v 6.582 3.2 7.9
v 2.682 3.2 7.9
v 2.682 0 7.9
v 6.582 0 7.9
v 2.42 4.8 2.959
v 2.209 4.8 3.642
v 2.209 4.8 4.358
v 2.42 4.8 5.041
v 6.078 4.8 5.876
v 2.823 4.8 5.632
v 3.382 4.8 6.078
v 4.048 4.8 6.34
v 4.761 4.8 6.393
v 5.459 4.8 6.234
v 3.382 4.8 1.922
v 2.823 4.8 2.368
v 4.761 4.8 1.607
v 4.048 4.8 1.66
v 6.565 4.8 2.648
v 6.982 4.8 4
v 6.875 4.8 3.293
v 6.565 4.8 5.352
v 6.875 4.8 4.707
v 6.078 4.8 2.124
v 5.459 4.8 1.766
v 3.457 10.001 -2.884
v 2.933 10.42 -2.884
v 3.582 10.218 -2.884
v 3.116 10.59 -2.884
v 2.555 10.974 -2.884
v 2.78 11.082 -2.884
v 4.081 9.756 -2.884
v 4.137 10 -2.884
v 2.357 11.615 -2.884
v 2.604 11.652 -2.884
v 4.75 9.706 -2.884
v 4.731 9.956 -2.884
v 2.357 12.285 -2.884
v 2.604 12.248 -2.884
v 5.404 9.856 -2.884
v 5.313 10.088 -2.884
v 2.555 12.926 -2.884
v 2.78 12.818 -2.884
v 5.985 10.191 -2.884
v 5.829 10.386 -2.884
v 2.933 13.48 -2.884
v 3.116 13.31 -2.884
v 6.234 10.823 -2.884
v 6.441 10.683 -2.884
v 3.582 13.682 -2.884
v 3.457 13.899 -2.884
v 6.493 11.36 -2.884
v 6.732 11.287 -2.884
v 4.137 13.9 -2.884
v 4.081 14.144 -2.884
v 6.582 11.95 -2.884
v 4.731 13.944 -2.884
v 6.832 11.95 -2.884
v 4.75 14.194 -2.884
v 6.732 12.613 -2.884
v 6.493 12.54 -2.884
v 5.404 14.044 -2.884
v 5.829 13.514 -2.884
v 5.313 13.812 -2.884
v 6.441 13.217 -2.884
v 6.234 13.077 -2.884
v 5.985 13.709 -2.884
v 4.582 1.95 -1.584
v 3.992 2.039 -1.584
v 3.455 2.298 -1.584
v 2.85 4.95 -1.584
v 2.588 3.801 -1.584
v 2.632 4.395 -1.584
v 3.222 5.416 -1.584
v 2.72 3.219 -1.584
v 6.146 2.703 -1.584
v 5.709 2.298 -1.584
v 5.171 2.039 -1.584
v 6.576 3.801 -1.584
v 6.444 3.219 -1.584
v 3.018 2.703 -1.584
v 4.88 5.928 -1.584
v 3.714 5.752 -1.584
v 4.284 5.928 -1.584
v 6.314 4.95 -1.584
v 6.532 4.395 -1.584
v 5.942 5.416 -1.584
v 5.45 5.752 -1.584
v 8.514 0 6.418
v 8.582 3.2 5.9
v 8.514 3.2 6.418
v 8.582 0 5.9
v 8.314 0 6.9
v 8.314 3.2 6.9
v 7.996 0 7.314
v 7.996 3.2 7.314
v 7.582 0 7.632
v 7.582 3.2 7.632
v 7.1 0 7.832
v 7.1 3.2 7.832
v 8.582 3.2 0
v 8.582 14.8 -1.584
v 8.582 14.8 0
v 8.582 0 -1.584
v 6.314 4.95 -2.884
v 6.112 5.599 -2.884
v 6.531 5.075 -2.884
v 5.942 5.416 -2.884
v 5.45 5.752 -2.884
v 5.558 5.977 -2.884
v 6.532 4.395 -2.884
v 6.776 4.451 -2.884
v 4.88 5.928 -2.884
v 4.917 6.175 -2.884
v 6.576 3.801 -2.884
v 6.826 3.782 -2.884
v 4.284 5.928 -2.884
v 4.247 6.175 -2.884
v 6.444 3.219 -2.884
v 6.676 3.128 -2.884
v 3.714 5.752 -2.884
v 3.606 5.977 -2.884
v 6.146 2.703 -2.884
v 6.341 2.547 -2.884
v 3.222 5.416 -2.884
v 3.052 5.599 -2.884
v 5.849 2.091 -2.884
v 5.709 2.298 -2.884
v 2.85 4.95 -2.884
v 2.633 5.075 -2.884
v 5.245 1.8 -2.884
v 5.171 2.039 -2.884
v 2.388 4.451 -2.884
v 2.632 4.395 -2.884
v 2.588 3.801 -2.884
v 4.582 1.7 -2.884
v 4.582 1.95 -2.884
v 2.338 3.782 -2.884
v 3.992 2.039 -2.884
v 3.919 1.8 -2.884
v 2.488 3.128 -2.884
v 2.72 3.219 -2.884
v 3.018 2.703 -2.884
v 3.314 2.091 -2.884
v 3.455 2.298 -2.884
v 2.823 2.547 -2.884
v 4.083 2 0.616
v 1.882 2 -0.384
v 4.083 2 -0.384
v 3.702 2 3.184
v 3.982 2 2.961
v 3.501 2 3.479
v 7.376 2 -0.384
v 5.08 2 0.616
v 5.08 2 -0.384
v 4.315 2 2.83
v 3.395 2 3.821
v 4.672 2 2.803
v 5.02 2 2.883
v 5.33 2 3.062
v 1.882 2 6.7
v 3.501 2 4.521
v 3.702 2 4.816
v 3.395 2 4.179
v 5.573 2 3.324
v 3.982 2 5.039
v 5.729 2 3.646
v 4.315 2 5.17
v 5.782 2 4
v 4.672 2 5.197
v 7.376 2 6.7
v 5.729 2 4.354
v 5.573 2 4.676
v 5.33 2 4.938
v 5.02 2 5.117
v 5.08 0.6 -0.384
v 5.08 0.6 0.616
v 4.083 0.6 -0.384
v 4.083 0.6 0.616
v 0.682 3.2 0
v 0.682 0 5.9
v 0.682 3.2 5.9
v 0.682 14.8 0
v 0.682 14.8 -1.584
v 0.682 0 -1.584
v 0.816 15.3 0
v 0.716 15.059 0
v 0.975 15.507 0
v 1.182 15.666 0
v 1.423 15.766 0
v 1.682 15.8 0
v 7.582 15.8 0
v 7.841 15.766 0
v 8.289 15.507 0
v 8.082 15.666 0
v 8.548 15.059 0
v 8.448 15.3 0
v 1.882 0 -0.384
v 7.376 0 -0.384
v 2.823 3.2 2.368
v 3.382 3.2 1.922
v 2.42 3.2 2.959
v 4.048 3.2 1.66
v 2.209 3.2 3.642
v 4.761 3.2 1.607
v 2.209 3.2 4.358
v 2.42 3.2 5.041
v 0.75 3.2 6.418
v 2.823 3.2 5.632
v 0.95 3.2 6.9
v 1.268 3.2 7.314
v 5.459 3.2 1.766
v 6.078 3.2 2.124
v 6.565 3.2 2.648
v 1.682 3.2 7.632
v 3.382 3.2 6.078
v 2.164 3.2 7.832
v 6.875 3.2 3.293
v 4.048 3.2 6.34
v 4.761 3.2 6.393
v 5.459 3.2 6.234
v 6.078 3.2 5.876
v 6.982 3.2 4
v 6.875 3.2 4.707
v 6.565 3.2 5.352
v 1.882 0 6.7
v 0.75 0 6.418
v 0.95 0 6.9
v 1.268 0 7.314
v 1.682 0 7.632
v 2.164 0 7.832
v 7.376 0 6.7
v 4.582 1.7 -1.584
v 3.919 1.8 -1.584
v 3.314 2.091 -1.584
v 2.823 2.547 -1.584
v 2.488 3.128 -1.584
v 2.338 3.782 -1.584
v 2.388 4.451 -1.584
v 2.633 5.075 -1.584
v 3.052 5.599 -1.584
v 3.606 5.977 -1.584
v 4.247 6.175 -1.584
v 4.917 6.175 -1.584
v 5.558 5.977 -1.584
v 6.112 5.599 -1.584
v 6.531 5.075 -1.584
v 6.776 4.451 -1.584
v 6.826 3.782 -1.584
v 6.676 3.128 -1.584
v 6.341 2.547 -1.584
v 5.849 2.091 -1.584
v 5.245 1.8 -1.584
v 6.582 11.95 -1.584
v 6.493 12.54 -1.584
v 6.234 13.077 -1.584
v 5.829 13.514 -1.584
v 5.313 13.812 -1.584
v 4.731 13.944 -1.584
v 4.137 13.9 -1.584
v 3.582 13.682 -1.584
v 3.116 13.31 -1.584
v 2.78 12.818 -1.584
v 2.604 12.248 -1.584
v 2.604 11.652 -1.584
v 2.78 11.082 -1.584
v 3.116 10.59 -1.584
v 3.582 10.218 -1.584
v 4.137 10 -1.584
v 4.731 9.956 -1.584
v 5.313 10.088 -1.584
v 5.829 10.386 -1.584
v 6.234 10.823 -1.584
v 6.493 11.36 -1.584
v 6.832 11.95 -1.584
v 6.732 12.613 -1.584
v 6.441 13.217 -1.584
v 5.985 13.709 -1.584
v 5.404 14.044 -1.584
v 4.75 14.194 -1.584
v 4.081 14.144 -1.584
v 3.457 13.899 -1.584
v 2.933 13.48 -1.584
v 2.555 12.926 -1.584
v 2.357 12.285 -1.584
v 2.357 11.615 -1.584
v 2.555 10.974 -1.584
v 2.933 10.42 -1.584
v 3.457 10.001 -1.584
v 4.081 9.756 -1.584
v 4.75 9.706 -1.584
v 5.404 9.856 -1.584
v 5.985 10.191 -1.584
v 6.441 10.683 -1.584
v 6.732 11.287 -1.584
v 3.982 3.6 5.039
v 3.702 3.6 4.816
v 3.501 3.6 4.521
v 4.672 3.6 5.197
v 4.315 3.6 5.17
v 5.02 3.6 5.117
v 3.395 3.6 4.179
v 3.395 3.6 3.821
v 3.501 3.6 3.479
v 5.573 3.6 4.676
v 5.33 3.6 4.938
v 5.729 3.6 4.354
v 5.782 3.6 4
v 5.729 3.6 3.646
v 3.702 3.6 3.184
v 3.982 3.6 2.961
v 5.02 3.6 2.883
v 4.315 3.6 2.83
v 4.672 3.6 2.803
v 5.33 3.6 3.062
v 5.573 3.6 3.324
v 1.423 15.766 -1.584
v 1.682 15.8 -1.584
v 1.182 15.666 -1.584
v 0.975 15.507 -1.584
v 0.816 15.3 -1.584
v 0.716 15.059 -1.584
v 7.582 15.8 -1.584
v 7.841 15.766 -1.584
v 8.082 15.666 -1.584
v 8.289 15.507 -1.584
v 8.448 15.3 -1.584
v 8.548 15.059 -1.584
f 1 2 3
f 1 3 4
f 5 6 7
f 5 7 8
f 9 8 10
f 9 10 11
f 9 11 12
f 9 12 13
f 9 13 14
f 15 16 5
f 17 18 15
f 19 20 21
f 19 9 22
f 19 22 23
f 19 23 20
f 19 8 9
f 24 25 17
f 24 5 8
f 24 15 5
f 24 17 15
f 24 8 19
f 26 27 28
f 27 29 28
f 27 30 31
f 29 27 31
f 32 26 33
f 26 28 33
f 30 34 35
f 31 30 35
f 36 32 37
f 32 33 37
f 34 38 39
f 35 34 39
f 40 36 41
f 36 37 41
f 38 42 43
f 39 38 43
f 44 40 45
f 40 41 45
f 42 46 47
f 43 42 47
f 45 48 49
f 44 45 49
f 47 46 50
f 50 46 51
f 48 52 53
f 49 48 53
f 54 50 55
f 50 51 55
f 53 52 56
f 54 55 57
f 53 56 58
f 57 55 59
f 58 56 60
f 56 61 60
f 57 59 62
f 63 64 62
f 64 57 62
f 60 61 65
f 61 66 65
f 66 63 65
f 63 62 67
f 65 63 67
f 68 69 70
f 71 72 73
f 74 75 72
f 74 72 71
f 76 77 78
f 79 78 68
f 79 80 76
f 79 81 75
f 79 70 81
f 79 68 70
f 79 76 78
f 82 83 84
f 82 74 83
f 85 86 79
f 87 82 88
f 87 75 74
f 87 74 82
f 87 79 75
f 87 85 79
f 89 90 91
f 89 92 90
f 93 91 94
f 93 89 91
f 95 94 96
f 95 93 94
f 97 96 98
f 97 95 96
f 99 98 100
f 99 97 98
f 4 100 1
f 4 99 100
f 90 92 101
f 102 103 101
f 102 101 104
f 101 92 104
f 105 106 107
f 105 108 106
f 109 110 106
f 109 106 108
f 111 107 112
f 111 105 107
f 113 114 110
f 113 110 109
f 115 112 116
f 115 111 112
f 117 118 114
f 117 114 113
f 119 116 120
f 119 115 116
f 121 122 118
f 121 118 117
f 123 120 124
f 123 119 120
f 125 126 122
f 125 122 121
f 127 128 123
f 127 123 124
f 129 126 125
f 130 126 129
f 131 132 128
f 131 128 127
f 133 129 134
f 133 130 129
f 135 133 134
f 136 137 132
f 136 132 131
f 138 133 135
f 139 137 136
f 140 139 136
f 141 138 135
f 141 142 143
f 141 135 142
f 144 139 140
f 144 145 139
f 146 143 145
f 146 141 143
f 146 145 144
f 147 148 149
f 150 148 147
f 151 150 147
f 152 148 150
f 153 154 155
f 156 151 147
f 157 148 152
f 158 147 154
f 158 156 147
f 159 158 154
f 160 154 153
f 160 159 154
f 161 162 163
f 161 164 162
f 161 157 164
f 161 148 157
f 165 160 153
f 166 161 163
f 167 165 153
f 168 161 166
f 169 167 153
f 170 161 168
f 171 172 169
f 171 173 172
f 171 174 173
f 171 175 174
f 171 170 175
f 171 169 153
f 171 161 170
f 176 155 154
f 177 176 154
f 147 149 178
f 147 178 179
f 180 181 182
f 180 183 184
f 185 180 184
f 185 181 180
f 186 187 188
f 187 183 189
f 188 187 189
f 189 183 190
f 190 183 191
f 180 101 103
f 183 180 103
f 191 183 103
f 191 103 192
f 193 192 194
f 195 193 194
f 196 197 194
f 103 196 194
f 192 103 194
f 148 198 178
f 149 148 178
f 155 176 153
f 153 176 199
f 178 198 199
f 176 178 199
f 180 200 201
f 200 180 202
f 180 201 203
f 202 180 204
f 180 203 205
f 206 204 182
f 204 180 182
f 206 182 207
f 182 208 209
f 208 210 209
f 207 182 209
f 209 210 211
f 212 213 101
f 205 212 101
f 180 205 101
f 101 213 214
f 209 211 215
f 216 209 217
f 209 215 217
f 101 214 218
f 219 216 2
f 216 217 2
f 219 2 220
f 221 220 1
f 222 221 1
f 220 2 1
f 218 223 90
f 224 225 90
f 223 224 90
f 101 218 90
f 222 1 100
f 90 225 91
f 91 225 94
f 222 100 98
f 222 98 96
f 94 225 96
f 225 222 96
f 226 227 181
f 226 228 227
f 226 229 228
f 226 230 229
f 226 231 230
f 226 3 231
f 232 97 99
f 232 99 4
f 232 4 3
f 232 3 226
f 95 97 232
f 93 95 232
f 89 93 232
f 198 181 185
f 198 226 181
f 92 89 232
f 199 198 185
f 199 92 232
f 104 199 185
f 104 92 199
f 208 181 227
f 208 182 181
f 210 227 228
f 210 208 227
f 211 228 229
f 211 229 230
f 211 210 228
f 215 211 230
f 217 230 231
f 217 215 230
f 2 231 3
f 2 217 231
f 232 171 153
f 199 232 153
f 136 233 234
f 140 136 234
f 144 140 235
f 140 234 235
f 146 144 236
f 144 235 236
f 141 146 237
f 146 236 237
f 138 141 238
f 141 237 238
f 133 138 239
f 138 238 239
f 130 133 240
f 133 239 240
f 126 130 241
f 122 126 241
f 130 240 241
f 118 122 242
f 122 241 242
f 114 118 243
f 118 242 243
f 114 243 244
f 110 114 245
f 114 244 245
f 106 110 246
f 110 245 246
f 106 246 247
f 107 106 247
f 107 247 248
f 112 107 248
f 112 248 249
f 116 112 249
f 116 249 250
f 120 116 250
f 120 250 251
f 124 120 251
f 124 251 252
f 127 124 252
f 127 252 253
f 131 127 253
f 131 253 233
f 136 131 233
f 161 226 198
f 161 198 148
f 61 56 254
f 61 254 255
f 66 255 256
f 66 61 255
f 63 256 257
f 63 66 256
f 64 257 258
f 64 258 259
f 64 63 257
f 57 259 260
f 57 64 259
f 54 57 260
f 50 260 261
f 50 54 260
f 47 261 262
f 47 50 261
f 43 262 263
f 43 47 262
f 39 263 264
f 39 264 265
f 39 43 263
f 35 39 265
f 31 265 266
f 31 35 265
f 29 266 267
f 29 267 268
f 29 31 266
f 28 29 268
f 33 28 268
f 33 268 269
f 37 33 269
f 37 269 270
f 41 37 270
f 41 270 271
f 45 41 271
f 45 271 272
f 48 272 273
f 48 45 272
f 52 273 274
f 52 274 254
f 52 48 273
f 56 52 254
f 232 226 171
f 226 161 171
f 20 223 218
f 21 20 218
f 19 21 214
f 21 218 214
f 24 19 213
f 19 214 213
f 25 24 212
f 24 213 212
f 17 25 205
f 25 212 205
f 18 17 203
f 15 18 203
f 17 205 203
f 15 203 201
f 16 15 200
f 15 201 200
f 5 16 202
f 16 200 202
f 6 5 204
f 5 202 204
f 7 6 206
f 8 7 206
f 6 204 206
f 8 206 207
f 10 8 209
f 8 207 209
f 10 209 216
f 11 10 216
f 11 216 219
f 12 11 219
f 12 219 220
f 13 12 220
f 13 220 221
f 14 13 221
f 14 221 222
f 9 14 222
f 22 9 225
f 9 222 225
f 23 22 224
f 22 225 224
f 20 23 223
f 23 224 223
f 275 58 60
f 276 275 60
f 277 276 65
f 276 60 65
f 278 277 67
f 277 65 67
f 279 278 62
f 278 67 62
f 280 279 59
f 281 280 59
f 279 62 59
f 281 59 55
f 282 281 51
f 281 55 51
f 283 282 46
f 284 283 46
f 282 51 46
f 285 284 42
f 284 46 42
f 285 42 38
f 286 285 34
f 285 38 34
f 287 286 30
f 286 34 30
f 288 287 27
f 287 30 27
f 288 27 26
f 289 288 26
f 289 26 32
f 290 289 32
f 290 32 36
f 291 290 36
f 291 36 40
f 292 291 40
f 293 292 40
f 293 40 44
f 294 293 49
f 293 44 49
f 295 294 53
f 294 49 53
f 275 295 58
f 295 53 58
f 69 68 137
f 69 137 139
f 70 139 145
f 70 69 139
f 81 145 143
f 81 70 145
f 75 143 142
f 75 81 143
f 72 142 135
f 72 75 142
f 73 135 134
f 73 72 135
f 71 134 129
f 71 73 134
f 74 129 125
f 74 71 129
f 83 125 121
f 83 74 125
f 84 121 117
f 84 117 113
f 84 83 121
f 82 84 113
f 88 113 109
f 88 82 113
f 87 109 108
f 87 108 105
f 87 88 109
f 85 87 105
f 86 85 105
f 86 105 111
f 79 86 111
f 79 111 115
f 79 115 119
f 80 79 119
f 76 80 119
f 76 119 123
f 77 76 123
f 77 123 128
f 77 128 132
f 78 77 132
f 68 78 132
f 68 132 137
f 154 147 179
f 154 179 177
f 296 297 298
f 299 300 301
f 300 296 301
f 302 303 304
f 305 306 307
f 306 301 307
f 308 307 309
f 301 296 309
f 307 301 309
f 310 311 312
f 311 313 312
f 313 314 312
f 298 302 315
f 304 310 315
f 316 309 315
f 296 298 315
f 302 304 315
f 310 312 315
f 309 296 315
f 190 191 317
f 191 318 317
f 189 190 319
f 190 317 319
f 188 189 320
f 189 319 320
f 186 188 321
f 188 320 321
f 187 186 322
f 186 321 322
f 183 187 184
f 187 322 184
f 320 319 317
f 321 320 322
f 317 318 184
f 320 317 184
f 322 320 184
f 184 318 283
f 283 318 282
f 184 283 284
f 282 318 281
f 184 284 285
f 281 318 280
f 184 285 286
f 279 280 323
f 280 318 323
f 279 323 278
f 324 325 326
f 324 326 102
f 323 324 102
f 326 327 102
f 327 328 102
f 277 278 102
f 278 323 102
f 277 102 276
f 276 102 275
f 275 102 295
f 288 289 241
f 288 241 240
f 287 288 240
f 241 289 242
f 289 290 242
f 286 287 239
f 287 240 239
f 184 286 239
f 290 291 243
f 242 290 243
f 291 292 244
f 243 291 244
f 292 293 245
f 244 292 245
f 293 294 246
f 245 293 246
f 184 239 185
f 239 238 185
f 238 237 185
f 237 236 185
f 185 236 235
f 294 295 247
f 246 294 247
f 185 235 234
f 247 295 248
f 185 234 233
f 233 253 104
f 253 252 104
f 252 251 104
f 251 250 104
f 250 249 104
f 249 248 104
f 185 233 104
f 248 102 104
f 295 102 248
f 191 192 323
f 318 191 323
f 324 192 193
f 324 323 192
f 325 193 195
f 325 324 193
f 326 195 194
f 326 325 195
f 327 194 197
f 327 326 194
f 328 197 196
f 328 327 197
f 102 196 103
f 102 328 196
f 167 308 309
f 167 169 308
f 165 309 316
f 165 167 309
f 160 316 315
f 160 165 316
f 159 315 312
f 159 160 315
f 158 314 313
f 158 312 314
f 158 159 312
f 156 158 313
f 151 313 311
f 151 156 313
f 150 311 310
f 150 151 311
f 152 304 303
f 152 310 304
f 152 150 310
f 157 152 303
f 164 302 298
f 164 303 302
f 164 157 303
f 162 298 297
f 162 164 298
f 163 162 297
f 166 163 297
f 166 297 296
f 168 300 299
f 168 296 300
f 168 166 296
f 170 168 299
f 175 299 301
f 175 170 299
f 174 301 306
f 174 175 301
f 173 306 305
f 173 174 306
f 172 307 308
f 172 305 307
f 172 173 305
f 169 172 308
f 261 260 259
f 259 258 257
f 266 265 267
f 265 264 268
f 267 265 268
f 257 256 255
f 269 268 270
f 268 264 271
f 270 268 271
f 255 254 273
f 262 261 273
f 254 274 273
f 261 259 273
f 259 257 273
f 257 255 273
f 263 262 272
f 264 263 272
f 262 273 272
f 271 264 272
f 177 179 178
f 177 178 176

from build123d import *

# Parameters (mm, degrees)
MAINBASESKETCH_W             = 15.8
MAINBASESKETCH_H             = 3.2
MAINBASEEXTRUDE_DEPTH        = 7.9
STUDSSKETCH_R                = 2.4
STUDSEXTRUDE_DEPTH           = 1.6
STUDSPATTERN_COUNT           = 2
STUDSPATTERN_PITCH           = 8
STUDSPATTERN_COUNT_DIR2      = 2
STUDSPATTERN_PITCH_DIR2      = 8
MAINBASESHELL_T              = -1.2
LCUTBLUE_DEPTH               = 19.555463972
LCUTBLUE_DEPTH_BACK          = 19.555463972
CUTADDEDTOLCUT_DEPTH         = 2
MADESLIMCUTSKETCH_W          = 7.9
MADESLIMCUTSKETCH_H          = 7.9
MADESLIMCUT_DEPTH            = 19.897228453
MADESLIMFILLEXT_REACH        = 20.897
SKETCH33_W                   = 5.500952983
SKETCH33_H                   = 1.199047018
SHORTLEXTENSIONSKETCH_W      = 1.583745828
SHORTLEXTENSIONSKETCH_H      = 7.9
SHORTLEXTENDEDCUTSKETCH_W    = 13.4
SHORTLEXTENDEDCUTSKETCH_H    = 1.582792846
SHORTLEXTENDEDCUT_DEPTH      = 2
SHORTLUNDERSTUMPS_START      = -0.2
SHORTLUNDERSTUMPSKETCH_W     = 0.996828098
SHORTLUNDERSTUMPSKETCH_H     = 1
SHORTLUNDERSTUMPS_DEPTH      = 1.6
SHORTLUPPERCIRCLES_START     = -0.2
SHORTLUPPERCIRCLESSKETCH_R   = 2.25
SHORTLUPPERCIRCLESSKETCH_R_2 = 2
SHORTLUPPERCIRCLES_DEPTH     = 1.5
CUT_EXTRUDE17_DEPTH          = 7.9
SKETCH60_W                   = 1.205928798
SKETCH60_H                   = 7.083745828
SKETCH63_W                   = 1.583745828
SKETCH63_H                   = 7.9
LPATTERN2_START              = -2.883745828
LPATTERN2_OUTLINE_R          = 2.25
LPATTERN2_OUTLINE_R_2        = 2
LPATTERN2_DEPTH              = 1.3
FILLET4_R                    = 1
FILLET16_R                   = 2


# Read off the part's stored shape, not the designer's step: LPattern2
with BuildPart() as part:
    # MainBaseSketch → MainBaseExtrude (new, symmetric)
    with BuildSketch(Plane.XY):
        with Locations((8.581967213, 1.6)):
            Rectangle(MAINBASESKETCH_W, MAINBASESKETCH_H)
    extrude(amount=MAINBASEEXTRUDE_DEPTH, both=True)

    # StudsSketch → StudsExtrude (add)
    with BuildSketch(Plane(origin=(0, 3.2, 0), x_dir=(1, 0, 0), z_dir=(0, 1, 0))):
        with Locations((4.581967213, 4)):
            Circle(STUDSSKETCH_R)
    studsextrude = extrude(amount=STUDSEXTRUDE_DEPTH)

    # StudsPattern: StudsExtrude 2 × 2
    with Locations(*[(j * STUDSPATTERN_PITCH_DIR2, 0, i * STUDSPATTERN_PITCH) for i in range(STUDSPATTERN_COUNT) for j in range(STUDSPATTERN_COUNT_DIR2) if (i, j) != (0, 0)]):
        add(studsextrude)

    # MainBaseShell
    mainbaseshell_openings = [part.faces().sort_by_distance(p)[0] for p in [
        (8.581967213, 0, 0),
    ]]
    offset(amount=MAINBASESHELL_T, openings=mainbaseshell_openings, kind=Kind.INTERSECTION)

    # LCUTBlueSketch → LCutBlue (cut, two sides: drawn at the far end of the back side and taken through both)
    with BuildSketch(Plane(origin=(0, 3.2, 0), x_dir=(1, 0, 0), z_dir=(0, 1, 0)).offset(-LCUTBLUE_DEPTH_BACK)):
        Polygon((8.581967213, 53.229874044), (8.581967213, 7.9), (8.581967213, 0), (16.481967213, 0), (61.811841258, 0), (125.917963912, 64.106122654), (72.688089868, 117.335996699), align=None)
    extrude(amount=LCUTBLUE_DEPTH + LCUTBLUE_DEPTH_BACK, mode=Mode.SUBTRACT)

    # CutAddedtoLSketch → CutAddedToLCut (add)
    with BuildSketch(Plane.XZ):
        Polygon((7.382920196, -6.7), (8.581967213, -6.7), (8.581967213, 0), (15.281967213, 0), (15.281967213, 1.199047018), (7.382920196, 1.199047018), (7.382920196, 0), align=None)
    extrude(amount=-CUTADDEDTOLCUT_DEPTH)

    # MadeSlimCutSketch → MadeSlimCut (cut, through all)
    with BuildSketch(Plane.XZ):
        with Locations((4.631967213, -3.95)):
            Rectangle(MADESLIMCUTSKETCH_W, MADESLIMCUTSKETCH_H)
    extrude(amount=-MADESLIMCUT_DEPTH, mode=Mode.SUBTRACT)

    # Sketch33 → MadeSlimFillExt (add, up to next)
    with BuildSketch(Plane.XZ, mode=Mode.PRIVATE) as madeslimfillext_sk1:
        with Locations((4.632443704, 0.599523509)):
            Rectangle(SKETCH33_W, SKETCH33_H)
    madeslimfillext_tool1 = extrude(madeslimfillext_sk1.sketch, amount=-MADESLIMFILLEXT_REACH, mode=Mode.PRIVATE) - part.part
    add(madeslimfillext_tool1.solids().sort_by_distance((4.632444, 0, 0.599524))[0])

    # ShortLExtension: sweep along a curve in space
    with BuildLine() as shortlextension_path:
        Line((0.681967213, 3.2, 0), (16.481967213, 3.2, 0))
    # ShortLExtensionSketch → ShortLExtension (sweep)
    with BuildSketch(Plane(origin=(16.481967213, 0, 0), x_dir=(0, 0, -1), z_dir=(1, 0, 0))):
        with Locations((0.791872914, 3.95)):
            Rectangle(SHORTLEXTENSIONSKETCH_W, SHORTLEXTENSIONSKETCH_H)
    sweep(path=shortlextension_path.line)

    # ShortLExtendedCutSketch → ShortLExtendedCut (cut)
    with BuildSketch(Plane.XZ):
        with Locations((8.581967213, 0.407650595)):
            Rectangle(SHORTLEXTENDEDCUTSKETCH_W, SHORTLEXTENDEDCUTSKETCH_H)
    extrude(amount=-SHORTLEXTENDEDCUT_DEPTH, mode=Mode.SUBTRACT)

    # ShortLUnderStumpSketch → ShortLUnderStumps (add)
    with BuildSketch(Plane.XZ.offset(-2).offset(SHORTLUNDERSTUMPS_START)):
        with Locations((4.581764801, 0.116254172)):
            Rectangle(SHORTLUNDERSTUMPSKETCH_W, SHORTLUNDERSTUMPSKETCH_H)
        with Locations((8.57767054, 0.116254172)):
            Rectangle(SHORTLUNDERSTUMPSKETCH_W, SHORTLUNDERSTUMPSKETCH_H)
        with Locations((12.582169625, 0.116254172)):
            Rectangle(SHORTLUNDERSTUMPSKETCH_W, SHORTLUNDERSTUMPSKETCH_H)
    extrude(amount=SHORTLUNDERSTUMPS_DEPTH)

    # ShortLUpperCirclesSketch → ShortLUpperCircles (add)
    # profile 1 of 2: a face of its own
    with BuildSketch(Plane(origin=(0, 0, -1.583745828), x_dir=(-1, 0, 0), z_dir=(0, 0, -1)).offset(SHORTLUPPERCIRCLES_START)):
        with Locations(Location((-12.581967213, 3.95, 0), (0, 0, 90))):
            Circle(SHORTLUPPERCIRCLESSKETCH_R)
        with Locations(Location((-12.581967213, 3.95, 0), (0, 0, 90))):
            Circle(SHORTLUPPERCIRCLESSKETCH_R_2, mode=Mode.SUBTRACT)
    # profile 2 of 2: a face of its own
    with BuildSketch(Plane(origin=(0, 0, -1.583745828), x_dir=(-1, 0, 0), z_dir=(0, 0, -1)).offset(SHORTLUPPERCIRCLES_START)):
        with Locations(Location((-4.581967213, 3.95, 0), (0, 0, 270))):
            Circle(SHORTLUPPERCIRCLESSKETCH_R)
        with Locations(Location((-4.581967213, 3.95, 0), (0, 0, 270))):
            Circle(SHORTLUPPERCIRCLESSKETCH_R_2, mode=Mode.SUBTRACT)
    extrude(amount=SHORTLUPPERCIRCLES_DEPTH)

    # Sketch59 → Cut-Extrude17 (cut)
    with BuildSketch(Plane.ZY.offset(-8.581967213)):
        Polygon((-1.583745828, 6.2), (-1.583745828, 7.9), (0, 7.9), (0, 3.2), (1.6, 3.2), (1.6, 4.8), (6.4, 4.8), (6.4, 3.2), (7.9, 3.2), (7.9, 0), (-1.583745828, 0), (-1.583745828, 1.7), (-2.883745828, 1.7), (-2.883745828, 6.2), align=None)
    extrude(amount=-CUT_EXTRUDE17_DEPTH, mode=Mode.SUBTRACT)

    # Sweep4: sweep along a curve in space
    with BuildLine() as sweep4_path:
        Line((8.581967213, 0, 6.7), (8.581967213, 2, 6.7))
    # Sketch60 → Sweep4 (sweep)
    with BuildSketch(Plane(origin=(0, 0, 0), x_dir=(-1, 0, 0), z_dir=(0, -1, 0))):
        with Locations((-7.979002814, -3.158127086)):
            Rectangle(SKETCH60_W, SKETCH60_H)
    sweep(path=sweep4_path.line)

    # Sweep5: sweep along a curve in space
    with BuildLine() as sweep5_path:
        Line((0.681967213, 7.9, 0), (8.581967213, 7.9, 0))
    # Sketch63 → Sweep5 (sweep)
    with BuildSketch(Plane.ZY.offset(-0.681967213)):
        with Locations((-0.791872914, 11.85)):
            Rectangle(SKETCH63_W, SKETCH63_H)
    sweep(path=sweep5_path.line)

    # LPattern2 outline → LPattern2 (add)
    with BuildSketch(Plane.XY.offset(LPATTERN2_START)):
        with Locations((4.581967213, 11.95)):
            Circle(LPATTERN2_OUTLINE_R)
        with Locations((4.581967213, 11.95)):
            Circle(LPATTERN2_OUTLINE_R_2, mode=Mode.SUBTRACT)
    extrude(amount=LPATTERN2_DEPTH)

    # Fillet4
    fillet4_edges = [part.edges().sort_by_distance(p)[0] for p in [
        (0.681967213, 15.8, -0.791872914),
        (8.581967213, 15.8, -0.791872914),
    ]]
    fillet(fillet4_edges, radius=FILLET4_R)

    # Fillet16
    fillet16_edges = [part.edges().sort_by_distance(p)[0] for p in [
        (8.581967213, 1.6, 7.9),
        (0.681967213, 1.6, 7.9),
    ]]
    fillet(fillet16_edges, radius=FILLET16_R)


solid = part.part
